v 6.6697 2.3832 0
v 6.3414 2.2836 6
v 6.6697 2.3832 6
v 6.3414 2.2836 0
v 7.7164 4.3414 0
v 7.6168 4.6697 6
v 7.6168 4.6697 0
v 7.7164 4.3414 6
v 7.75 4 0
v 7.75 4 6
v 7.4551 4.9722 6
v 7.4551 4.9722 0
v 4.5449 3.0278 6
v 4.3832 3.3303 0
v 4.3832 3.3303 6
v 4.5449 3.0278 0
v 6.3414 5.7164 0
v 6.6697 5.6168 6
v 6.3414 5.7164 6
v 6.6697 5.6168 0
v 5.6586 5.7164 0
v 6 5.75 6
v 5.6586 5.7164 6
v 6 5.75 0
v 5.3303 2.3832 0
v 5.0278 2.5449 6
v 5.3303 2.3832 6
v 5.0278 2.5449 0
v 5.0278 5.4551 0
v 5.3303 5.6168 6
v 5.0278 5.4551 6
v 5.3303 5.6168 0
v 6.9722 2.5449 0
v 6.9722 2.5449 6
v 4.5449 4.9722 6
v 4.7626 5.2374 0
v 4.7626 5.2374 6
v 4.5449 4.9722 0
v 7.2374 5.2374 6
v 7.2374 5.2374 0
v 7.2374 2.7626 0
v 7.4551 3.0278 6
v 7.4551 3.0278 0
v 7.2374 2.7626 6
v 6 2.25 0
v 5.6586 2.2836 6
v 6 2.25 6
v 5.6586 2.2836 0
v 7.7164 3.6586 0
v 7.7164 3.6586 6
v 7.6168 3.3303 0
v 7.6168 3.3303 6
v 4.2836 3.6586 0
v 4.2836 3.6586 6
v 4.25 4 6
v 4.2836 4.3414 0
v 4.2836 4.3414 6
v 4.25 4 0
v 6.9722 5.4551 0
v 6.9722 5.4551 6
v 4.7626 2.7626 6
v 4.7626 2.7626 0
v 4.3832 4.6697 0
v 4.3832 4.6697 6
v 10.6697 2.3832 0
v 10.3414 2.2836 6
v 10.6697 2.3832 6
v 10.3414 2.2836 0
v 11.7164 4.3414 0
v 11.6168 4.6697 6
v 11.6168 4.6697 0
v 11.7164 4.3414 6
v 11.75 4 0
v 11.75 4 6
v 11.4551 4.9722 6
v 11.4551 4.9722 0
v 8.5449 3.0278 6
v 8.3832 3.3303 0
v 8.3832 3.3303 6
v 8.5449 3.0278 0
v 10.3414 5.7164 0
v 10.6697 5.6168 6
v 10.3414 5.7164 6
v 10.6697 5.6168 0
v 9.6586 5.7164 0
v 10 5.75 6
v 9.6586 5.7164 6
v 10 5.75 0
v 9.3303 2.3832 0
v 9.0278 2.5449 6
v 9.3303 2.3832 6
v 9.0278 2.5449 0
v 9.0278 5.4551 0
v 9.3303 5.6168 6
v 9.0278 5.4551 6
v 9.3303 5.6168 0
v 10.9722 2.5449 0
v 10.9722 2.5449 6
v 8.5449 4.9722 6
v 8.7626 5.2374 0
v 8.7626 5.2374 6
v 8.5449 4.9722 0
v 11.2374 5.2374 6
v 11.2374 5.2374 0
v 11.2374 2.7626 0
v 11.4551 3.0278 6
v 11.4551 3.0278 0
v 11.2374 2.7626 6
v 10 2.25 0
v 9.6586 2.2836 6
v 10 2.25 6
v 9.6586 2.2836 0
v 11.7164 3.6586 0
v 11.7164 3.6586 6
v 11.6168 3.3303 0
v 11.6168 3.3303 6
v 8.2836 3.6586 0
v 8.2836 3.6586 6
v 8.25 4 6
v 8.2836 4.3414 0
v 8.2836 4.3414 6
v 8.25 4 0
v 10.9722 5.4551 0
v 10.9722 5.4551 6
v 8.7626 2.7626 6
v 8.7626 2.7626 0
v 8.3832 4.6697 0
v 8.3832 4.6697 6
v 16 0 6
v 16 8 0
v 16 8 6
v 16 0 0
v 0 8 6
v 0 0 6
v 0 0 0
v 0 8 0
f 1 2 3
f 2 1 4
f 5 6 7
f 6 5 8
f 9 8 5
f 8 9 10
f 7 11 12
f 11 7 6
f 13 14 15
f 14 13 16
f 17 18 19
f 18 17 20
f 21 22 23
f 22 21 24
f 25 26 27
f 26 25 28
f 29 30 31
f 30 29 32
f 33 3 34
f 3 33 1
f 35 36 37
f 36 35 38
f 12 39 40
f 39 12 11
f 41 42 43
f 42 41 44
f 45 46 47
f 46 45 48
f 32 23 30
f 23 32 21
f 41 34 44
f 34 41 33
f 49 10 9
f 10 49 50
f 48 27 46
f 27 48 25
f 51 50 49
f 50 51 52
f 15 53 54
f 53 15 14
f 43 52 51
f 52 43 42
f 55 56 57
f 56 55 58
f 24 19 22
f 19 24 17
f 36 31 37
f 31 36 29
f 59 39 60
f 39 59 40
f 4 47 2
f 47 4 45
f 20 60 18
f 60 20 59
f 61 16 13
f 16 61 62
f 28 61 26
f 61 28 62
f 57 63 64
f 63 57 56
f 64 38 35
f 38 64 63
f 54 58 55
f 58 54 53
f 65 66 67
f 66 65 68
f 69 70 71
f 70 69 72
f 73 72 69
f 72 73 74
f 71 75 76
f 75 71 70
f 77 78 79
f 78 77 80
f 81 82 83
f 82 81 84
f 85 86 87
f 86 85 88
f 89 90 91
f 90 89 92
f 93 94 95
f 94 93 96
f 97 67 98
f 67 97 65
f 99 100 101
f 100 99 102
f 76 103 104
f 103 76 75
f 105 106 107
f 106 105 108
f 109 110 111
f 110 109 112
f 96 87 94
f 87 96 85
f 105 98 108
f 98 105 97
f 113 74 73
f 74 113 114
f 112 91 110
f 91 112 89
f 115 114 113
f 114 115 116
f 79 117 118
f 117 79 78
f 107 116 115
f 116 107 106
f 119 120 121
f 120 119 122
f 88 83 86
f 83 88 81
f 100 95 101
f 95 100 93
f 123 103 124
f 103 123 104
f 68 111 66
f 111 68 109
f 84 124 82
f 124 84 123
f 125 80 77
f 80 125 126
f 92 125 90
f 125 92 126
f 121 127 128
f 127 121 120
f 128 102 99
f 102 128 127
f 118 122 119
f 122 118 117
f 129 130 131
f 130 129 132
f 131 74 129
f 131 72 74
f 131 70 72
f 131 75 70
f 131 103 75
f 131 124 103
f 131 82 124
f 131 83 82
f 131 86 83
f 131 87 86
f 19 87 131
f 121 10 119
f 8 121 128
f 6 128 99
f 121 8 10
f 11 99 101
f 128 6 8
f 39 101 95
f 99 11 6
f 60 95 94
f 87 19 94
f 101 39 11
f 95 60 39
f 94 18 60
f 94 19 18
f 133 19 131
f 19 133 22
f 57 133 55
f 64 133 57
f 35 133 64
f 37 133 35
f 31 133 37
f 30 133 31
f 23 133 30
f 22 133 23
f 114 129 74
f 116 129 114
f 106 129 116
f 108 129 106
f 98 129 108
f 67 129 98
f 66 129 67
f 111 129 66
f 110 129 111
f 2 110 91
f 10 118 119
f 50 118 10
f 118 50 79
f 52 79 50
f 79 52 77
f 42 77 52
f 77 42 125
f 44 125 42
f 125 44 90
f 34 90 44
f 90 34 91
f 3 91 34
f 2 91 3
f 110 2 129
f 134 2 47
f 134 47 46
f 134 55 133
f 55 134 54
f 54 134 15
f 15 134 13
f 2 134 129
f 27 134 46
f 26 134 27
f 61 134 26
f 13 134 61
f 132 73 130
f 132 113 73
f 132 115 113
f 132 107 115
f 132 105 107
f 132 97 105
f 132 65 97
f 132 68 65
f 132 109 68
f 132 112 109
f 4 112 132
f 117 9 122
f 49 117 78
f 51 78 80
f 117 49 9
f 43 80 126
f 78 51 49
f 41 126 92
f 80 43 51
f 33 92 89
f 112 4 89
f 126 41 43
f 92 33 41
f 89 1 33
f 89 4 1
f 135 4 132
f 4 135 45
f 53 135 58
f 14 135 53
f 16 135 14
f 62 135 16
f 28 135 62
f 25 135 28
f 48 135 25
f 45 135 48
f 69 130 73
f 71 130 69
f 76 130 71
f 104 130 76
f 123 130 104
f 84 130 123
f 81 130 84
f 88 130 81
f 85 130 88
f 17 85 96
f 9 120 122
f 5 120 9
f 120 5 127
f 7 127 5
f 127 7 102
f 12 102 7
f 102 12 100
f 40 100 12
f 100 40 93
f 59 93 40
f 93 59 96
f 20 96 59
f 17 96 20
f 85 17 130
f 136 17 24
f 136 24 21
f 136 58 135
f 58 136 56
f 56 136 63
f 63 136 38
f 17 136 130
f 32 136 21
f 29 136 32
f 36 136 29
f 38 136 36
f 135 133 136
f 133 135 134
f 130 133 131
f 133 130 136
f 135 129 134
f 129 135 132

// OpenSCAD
$fn = 32;

// ----------------------------------------------------------------------
// Micro pad: two-hole pad, 5-20 mm class
// ----------------------------------------------------------------------

// --- parameters (mm) ---
pad_l = 16;               // pad length, X
pad_w = 8;                // pad width, Y
pad_t = 6;                // pad thickness, Z
hole_d = 3.5;             // hole diameter
hole_x = 6;               // X of the first hole centre
fit_tol = 0.02;           // tolerance for press fits, mm
free_tol = 0.2;           // tolerance for clearance fits, mm

difference() {
  cube([pad_l, pad_w, pad_t]);
  for (x = [hole_x, pad_l - hole_x])
    translate([x, pad_w / 2, -1])
      cylinder(h = pad_t + 2, d = hole_d);
}
